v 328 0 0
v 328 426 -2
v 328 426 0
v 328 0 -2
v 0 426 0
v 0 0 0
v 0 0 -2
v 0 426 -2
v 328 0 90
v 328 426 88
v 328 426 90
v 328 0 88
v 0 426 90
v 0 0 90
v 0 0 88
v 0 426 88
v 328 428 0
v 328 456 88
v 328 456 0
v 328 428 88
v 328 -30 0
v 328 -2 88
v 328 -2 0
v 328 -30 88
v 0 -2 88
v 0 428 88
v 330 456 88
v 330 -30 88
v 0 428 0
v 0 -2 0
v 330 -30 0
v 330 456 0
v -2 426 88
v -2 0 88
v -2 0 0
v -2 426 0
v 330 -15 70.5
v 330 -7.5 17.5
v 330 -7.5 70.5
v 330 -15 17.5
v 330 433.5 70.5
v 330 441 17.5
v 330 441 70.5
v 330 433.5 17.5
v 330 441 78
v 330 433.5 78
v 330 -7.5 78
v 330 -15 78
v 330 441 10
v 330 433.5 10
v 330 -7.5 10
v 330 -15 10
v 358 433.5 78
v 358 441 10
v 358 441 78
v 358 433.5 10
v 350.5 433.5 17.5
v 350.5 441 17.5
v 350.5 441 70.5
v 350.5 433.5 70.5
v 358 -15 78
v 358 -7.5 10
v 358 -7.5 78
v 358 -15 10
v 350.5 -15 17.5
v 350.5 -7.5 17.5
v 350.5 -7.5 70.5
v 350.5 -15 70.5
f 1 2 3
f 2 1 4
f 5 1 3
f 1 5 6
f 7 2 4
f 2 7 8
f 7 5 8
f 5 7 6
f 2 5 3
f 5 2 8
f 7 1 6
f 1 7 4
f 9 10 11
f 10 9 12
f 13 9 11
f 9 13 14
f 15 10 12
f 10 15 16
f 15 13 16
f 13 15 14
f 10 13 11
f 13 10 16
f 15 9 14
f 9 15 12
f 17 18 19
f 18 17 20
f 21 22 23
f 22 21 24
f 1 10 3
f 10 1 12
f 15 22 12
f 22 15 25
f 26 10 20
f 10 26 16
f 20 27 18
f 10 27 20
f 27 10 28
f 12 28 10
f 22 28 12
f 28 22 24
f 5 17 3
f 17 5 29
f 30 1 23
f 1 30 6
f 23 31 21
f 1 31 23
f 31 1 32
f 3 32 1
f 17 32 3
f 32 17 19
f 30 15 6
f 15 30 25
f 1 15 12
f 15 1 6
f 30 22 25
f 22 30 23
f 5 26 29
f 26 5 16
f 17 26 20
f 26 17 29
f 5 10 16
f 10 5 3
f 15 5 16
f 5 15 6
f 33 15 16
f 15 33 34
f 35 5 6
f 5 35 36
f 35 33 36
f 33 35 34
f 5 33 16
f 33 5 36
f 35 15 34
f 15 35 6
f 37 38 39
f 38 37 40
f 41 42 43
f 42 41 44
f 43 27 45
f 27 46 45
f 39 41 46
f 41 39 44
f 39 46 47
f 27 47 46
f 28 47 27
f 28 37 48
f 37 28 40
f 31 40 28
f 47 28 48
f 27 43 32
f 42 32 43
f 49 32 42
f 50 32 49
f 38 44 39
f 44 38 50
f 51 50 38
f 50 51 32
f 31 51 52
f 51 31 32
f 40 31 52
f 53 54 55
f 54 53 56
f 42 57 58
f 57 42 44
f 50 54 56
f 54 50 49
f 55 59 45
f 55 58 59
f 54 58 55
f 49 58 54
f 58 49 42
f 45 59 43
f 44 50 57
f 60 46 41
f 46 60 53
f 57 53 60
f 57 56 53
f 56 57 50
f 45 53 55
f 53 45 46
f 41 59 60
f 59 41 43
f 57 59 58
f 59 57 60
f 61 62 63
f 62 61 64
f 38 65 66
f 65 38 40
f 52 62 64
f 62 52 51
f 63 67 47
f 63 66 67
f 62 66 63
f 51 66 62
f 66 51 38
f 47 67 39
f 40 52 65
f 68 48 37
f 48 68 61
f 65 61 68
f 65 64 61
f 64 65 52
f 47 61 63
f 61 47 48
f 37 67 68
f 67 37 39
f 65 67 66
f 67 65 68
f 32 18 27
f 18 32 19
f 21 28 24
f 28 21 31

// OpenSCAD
// http://www.gabiart.com.ar/pdf/racknet_accesorios.pdf

ESPESOR_CHAPA = 2;
COLOR_GABINETE = [1,1,1];
COLOR_MANIJAS = [1,1,1]*.7;


module caja(A, P, H, espesor_chapa=1) {
    translate([0,0,-espesor_chapa]) {
        cube([P,A,espesor_chapa]);
        translate([0,0,H+espesor_chapa])
            cube([P,A,espesor_chapa]);
        translate([0,-espesor_chapa,espesor_chapa])
            cube([P,espesor_chapa,H]);
        translate([0,A,espesor_chapa])
            cube([P,espesor_chapa,H]);
        translate([-espesor_chapa,0,espesor_chapa])
            cube([espesor_chapa,A,H]);
        translate([P,0,espesor_chapa])
            cube([espesor_chapa,A,H]);
    }
}

module _frente_rack_(H,A) {
    tamanio_soportes = 30;
    diametro_manijas = 7.5;
    
    color(COLOR_GABINETE)
        translate([0,-tamanio_soportes,0])
            cube([ESPESOR_CHAPA,A+2*tamanio_soportes,H]);
    color(COLOR_MANIJAS) {
        translate([0,-tamanio_soportes/2,10])
            cube([30,diametro_manijas,diametro_manijas]);
        translate([0,-tamanio_soportes/2,H-diametro_manijas-10])
            cube([30,diametro_manijas,diametro_manijas]);
        translate([30-diametro_manijas,-tamanio_soportes/2,10])
            cube([diametro_manijas,diametro_manijas,H-2*10]);
        
        translate([0,A+tamanio_soportes/2-diametro_manijas,0]) {
            translate([0,0,10])
                cube([30,diametro_manijas,diametro_manijas]);
            translate([0,0,H-diametro_manijas-10])
                cube([30,diametro_manijas,diametro_manijas]);
            translate([30-diametro_manijas,0,10])
                cube([diametro_manijas,diametro_manijas,H-2*10]);
        }
    }
}

module serie507(codigo) {
    // http://www.gabiart.com.ar/espanol/gabinetes_507.php#
    
    if (codigo == 2001) {
        color(COLOR_GABINETE)
            caja(A=426, P=268, H=88, espesor_chapa=ESPESOR_CHAPA);
        translate([268,0,0])
            _frente_rack_(A=426,H=88);
    }
    if (codigo == 2002) {
        color(COLOR_GABINETE)
            caja(A=426, P=328, H=88, espesor_chapa=ESPESOR_CHAPA);
        translate([328,0,0])
            _frente_rack_(A=426,H=88);
    }
    if (codigo == 3001) {
        color(COLOR_GABINETE)
            caja(A=426, P=268, H=132, espesor_chapa=ESPESOR_CHAPA);
        translate([268,0,0])
            _frente_rack_(A=426,H=132);
    }
    if (codigo == 3002) {
        color(COLOR_GABINETE)
            caja(A=426, P=328, H=132, espesor_chapa=ESPESOR_CHAPA);
        translate([328,0,0])
            _frente_rack_(A=426,H=132);
    }
    if (codigo == 4001) {
        color(COLOR_GABINETE)
            caja(A=426, P=268, H=177, espesor_chapa=ESPESOR_CHAPA);
        translate([268,0,0])
            _frente_rack_(A=426,H=177);
    }
    if (codigo == 4002) {
        color(COLOR_GABINETE)
            caja(A=426, P=328, H=177, espesor_chapa=ESPESOR_CHAPA);
        translate([328,0,0])
            _frente_rack_(A=426,H=177);
    }
    
}

serie507(2002);
